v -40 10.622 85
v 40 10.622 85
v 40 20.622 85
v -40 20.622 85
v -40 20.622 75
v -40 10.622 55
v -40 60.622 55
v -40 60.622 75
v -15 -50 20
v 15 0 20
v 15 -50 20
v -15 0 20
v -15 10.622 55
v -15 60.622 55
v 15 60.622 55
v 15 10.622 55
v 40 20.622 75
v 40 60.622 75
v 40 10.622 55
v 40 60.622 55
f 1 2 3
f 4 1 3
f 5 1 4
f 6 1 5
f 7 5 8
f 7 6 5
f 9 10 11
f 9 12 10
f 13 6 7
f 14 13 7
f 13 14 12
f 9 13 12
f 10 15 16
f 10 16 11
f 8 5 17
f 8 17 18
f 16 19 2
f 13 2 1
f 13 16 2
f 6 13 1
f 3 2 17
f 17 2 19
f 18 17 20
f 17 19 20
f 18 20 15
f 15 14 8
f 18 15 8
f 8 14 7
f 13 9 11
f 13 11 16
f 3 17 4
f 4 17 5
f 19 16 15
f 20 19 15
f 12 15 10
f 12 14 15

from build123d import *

# Parameters (mm, degrees)
PAD001_DEPTH = 15
SKETCH002_W  = 50
SKETCH002_H  = 80
PAD002_DEPTH = 20
SKETCH003_W  = 10
SKETCH003_H  = 80
PAD003_DEPTH = 10


with BuildPart() as part:
    # Sketch001 → Pad001 (new body, symmetric)
    with BuildSketch(Plane(origin=(0, 0, 0), x_dir=(0, -1, 0), z_dir=(-1, 0, 0))):
        Polygon((0, 20), (50, 20), (-10.621778, 55), (-60.621778, 55), align=None)
    extrude(amount=PAD001_DEPTH, both=True)

    # Sketch002 → Pad002 (new body)
    with BuildSketch(Plane(origin=(0, 0, 55), x_dir=(0, 1, 0), z_dir=(0, 0, 1))):
        with Locations((35.621778, 0)):
            Rectangle(SKETCH002_W, SKETCH002_H)
    extrude(amount=PAD002_DEPTH)

    # Sketch003 → Pad003 (new body)
    with BuildSketch(Plane(origin=(0, 0, 75), x_dir=(0, 1, 0), z_dir=(0, 0, 1))):
        with Locations((15.621778, 0)):
            Rectangle(SKETCH003_W, SKETCH003_H)
    extrude(amount=PAD003_DEPTH)


solid = part.part
